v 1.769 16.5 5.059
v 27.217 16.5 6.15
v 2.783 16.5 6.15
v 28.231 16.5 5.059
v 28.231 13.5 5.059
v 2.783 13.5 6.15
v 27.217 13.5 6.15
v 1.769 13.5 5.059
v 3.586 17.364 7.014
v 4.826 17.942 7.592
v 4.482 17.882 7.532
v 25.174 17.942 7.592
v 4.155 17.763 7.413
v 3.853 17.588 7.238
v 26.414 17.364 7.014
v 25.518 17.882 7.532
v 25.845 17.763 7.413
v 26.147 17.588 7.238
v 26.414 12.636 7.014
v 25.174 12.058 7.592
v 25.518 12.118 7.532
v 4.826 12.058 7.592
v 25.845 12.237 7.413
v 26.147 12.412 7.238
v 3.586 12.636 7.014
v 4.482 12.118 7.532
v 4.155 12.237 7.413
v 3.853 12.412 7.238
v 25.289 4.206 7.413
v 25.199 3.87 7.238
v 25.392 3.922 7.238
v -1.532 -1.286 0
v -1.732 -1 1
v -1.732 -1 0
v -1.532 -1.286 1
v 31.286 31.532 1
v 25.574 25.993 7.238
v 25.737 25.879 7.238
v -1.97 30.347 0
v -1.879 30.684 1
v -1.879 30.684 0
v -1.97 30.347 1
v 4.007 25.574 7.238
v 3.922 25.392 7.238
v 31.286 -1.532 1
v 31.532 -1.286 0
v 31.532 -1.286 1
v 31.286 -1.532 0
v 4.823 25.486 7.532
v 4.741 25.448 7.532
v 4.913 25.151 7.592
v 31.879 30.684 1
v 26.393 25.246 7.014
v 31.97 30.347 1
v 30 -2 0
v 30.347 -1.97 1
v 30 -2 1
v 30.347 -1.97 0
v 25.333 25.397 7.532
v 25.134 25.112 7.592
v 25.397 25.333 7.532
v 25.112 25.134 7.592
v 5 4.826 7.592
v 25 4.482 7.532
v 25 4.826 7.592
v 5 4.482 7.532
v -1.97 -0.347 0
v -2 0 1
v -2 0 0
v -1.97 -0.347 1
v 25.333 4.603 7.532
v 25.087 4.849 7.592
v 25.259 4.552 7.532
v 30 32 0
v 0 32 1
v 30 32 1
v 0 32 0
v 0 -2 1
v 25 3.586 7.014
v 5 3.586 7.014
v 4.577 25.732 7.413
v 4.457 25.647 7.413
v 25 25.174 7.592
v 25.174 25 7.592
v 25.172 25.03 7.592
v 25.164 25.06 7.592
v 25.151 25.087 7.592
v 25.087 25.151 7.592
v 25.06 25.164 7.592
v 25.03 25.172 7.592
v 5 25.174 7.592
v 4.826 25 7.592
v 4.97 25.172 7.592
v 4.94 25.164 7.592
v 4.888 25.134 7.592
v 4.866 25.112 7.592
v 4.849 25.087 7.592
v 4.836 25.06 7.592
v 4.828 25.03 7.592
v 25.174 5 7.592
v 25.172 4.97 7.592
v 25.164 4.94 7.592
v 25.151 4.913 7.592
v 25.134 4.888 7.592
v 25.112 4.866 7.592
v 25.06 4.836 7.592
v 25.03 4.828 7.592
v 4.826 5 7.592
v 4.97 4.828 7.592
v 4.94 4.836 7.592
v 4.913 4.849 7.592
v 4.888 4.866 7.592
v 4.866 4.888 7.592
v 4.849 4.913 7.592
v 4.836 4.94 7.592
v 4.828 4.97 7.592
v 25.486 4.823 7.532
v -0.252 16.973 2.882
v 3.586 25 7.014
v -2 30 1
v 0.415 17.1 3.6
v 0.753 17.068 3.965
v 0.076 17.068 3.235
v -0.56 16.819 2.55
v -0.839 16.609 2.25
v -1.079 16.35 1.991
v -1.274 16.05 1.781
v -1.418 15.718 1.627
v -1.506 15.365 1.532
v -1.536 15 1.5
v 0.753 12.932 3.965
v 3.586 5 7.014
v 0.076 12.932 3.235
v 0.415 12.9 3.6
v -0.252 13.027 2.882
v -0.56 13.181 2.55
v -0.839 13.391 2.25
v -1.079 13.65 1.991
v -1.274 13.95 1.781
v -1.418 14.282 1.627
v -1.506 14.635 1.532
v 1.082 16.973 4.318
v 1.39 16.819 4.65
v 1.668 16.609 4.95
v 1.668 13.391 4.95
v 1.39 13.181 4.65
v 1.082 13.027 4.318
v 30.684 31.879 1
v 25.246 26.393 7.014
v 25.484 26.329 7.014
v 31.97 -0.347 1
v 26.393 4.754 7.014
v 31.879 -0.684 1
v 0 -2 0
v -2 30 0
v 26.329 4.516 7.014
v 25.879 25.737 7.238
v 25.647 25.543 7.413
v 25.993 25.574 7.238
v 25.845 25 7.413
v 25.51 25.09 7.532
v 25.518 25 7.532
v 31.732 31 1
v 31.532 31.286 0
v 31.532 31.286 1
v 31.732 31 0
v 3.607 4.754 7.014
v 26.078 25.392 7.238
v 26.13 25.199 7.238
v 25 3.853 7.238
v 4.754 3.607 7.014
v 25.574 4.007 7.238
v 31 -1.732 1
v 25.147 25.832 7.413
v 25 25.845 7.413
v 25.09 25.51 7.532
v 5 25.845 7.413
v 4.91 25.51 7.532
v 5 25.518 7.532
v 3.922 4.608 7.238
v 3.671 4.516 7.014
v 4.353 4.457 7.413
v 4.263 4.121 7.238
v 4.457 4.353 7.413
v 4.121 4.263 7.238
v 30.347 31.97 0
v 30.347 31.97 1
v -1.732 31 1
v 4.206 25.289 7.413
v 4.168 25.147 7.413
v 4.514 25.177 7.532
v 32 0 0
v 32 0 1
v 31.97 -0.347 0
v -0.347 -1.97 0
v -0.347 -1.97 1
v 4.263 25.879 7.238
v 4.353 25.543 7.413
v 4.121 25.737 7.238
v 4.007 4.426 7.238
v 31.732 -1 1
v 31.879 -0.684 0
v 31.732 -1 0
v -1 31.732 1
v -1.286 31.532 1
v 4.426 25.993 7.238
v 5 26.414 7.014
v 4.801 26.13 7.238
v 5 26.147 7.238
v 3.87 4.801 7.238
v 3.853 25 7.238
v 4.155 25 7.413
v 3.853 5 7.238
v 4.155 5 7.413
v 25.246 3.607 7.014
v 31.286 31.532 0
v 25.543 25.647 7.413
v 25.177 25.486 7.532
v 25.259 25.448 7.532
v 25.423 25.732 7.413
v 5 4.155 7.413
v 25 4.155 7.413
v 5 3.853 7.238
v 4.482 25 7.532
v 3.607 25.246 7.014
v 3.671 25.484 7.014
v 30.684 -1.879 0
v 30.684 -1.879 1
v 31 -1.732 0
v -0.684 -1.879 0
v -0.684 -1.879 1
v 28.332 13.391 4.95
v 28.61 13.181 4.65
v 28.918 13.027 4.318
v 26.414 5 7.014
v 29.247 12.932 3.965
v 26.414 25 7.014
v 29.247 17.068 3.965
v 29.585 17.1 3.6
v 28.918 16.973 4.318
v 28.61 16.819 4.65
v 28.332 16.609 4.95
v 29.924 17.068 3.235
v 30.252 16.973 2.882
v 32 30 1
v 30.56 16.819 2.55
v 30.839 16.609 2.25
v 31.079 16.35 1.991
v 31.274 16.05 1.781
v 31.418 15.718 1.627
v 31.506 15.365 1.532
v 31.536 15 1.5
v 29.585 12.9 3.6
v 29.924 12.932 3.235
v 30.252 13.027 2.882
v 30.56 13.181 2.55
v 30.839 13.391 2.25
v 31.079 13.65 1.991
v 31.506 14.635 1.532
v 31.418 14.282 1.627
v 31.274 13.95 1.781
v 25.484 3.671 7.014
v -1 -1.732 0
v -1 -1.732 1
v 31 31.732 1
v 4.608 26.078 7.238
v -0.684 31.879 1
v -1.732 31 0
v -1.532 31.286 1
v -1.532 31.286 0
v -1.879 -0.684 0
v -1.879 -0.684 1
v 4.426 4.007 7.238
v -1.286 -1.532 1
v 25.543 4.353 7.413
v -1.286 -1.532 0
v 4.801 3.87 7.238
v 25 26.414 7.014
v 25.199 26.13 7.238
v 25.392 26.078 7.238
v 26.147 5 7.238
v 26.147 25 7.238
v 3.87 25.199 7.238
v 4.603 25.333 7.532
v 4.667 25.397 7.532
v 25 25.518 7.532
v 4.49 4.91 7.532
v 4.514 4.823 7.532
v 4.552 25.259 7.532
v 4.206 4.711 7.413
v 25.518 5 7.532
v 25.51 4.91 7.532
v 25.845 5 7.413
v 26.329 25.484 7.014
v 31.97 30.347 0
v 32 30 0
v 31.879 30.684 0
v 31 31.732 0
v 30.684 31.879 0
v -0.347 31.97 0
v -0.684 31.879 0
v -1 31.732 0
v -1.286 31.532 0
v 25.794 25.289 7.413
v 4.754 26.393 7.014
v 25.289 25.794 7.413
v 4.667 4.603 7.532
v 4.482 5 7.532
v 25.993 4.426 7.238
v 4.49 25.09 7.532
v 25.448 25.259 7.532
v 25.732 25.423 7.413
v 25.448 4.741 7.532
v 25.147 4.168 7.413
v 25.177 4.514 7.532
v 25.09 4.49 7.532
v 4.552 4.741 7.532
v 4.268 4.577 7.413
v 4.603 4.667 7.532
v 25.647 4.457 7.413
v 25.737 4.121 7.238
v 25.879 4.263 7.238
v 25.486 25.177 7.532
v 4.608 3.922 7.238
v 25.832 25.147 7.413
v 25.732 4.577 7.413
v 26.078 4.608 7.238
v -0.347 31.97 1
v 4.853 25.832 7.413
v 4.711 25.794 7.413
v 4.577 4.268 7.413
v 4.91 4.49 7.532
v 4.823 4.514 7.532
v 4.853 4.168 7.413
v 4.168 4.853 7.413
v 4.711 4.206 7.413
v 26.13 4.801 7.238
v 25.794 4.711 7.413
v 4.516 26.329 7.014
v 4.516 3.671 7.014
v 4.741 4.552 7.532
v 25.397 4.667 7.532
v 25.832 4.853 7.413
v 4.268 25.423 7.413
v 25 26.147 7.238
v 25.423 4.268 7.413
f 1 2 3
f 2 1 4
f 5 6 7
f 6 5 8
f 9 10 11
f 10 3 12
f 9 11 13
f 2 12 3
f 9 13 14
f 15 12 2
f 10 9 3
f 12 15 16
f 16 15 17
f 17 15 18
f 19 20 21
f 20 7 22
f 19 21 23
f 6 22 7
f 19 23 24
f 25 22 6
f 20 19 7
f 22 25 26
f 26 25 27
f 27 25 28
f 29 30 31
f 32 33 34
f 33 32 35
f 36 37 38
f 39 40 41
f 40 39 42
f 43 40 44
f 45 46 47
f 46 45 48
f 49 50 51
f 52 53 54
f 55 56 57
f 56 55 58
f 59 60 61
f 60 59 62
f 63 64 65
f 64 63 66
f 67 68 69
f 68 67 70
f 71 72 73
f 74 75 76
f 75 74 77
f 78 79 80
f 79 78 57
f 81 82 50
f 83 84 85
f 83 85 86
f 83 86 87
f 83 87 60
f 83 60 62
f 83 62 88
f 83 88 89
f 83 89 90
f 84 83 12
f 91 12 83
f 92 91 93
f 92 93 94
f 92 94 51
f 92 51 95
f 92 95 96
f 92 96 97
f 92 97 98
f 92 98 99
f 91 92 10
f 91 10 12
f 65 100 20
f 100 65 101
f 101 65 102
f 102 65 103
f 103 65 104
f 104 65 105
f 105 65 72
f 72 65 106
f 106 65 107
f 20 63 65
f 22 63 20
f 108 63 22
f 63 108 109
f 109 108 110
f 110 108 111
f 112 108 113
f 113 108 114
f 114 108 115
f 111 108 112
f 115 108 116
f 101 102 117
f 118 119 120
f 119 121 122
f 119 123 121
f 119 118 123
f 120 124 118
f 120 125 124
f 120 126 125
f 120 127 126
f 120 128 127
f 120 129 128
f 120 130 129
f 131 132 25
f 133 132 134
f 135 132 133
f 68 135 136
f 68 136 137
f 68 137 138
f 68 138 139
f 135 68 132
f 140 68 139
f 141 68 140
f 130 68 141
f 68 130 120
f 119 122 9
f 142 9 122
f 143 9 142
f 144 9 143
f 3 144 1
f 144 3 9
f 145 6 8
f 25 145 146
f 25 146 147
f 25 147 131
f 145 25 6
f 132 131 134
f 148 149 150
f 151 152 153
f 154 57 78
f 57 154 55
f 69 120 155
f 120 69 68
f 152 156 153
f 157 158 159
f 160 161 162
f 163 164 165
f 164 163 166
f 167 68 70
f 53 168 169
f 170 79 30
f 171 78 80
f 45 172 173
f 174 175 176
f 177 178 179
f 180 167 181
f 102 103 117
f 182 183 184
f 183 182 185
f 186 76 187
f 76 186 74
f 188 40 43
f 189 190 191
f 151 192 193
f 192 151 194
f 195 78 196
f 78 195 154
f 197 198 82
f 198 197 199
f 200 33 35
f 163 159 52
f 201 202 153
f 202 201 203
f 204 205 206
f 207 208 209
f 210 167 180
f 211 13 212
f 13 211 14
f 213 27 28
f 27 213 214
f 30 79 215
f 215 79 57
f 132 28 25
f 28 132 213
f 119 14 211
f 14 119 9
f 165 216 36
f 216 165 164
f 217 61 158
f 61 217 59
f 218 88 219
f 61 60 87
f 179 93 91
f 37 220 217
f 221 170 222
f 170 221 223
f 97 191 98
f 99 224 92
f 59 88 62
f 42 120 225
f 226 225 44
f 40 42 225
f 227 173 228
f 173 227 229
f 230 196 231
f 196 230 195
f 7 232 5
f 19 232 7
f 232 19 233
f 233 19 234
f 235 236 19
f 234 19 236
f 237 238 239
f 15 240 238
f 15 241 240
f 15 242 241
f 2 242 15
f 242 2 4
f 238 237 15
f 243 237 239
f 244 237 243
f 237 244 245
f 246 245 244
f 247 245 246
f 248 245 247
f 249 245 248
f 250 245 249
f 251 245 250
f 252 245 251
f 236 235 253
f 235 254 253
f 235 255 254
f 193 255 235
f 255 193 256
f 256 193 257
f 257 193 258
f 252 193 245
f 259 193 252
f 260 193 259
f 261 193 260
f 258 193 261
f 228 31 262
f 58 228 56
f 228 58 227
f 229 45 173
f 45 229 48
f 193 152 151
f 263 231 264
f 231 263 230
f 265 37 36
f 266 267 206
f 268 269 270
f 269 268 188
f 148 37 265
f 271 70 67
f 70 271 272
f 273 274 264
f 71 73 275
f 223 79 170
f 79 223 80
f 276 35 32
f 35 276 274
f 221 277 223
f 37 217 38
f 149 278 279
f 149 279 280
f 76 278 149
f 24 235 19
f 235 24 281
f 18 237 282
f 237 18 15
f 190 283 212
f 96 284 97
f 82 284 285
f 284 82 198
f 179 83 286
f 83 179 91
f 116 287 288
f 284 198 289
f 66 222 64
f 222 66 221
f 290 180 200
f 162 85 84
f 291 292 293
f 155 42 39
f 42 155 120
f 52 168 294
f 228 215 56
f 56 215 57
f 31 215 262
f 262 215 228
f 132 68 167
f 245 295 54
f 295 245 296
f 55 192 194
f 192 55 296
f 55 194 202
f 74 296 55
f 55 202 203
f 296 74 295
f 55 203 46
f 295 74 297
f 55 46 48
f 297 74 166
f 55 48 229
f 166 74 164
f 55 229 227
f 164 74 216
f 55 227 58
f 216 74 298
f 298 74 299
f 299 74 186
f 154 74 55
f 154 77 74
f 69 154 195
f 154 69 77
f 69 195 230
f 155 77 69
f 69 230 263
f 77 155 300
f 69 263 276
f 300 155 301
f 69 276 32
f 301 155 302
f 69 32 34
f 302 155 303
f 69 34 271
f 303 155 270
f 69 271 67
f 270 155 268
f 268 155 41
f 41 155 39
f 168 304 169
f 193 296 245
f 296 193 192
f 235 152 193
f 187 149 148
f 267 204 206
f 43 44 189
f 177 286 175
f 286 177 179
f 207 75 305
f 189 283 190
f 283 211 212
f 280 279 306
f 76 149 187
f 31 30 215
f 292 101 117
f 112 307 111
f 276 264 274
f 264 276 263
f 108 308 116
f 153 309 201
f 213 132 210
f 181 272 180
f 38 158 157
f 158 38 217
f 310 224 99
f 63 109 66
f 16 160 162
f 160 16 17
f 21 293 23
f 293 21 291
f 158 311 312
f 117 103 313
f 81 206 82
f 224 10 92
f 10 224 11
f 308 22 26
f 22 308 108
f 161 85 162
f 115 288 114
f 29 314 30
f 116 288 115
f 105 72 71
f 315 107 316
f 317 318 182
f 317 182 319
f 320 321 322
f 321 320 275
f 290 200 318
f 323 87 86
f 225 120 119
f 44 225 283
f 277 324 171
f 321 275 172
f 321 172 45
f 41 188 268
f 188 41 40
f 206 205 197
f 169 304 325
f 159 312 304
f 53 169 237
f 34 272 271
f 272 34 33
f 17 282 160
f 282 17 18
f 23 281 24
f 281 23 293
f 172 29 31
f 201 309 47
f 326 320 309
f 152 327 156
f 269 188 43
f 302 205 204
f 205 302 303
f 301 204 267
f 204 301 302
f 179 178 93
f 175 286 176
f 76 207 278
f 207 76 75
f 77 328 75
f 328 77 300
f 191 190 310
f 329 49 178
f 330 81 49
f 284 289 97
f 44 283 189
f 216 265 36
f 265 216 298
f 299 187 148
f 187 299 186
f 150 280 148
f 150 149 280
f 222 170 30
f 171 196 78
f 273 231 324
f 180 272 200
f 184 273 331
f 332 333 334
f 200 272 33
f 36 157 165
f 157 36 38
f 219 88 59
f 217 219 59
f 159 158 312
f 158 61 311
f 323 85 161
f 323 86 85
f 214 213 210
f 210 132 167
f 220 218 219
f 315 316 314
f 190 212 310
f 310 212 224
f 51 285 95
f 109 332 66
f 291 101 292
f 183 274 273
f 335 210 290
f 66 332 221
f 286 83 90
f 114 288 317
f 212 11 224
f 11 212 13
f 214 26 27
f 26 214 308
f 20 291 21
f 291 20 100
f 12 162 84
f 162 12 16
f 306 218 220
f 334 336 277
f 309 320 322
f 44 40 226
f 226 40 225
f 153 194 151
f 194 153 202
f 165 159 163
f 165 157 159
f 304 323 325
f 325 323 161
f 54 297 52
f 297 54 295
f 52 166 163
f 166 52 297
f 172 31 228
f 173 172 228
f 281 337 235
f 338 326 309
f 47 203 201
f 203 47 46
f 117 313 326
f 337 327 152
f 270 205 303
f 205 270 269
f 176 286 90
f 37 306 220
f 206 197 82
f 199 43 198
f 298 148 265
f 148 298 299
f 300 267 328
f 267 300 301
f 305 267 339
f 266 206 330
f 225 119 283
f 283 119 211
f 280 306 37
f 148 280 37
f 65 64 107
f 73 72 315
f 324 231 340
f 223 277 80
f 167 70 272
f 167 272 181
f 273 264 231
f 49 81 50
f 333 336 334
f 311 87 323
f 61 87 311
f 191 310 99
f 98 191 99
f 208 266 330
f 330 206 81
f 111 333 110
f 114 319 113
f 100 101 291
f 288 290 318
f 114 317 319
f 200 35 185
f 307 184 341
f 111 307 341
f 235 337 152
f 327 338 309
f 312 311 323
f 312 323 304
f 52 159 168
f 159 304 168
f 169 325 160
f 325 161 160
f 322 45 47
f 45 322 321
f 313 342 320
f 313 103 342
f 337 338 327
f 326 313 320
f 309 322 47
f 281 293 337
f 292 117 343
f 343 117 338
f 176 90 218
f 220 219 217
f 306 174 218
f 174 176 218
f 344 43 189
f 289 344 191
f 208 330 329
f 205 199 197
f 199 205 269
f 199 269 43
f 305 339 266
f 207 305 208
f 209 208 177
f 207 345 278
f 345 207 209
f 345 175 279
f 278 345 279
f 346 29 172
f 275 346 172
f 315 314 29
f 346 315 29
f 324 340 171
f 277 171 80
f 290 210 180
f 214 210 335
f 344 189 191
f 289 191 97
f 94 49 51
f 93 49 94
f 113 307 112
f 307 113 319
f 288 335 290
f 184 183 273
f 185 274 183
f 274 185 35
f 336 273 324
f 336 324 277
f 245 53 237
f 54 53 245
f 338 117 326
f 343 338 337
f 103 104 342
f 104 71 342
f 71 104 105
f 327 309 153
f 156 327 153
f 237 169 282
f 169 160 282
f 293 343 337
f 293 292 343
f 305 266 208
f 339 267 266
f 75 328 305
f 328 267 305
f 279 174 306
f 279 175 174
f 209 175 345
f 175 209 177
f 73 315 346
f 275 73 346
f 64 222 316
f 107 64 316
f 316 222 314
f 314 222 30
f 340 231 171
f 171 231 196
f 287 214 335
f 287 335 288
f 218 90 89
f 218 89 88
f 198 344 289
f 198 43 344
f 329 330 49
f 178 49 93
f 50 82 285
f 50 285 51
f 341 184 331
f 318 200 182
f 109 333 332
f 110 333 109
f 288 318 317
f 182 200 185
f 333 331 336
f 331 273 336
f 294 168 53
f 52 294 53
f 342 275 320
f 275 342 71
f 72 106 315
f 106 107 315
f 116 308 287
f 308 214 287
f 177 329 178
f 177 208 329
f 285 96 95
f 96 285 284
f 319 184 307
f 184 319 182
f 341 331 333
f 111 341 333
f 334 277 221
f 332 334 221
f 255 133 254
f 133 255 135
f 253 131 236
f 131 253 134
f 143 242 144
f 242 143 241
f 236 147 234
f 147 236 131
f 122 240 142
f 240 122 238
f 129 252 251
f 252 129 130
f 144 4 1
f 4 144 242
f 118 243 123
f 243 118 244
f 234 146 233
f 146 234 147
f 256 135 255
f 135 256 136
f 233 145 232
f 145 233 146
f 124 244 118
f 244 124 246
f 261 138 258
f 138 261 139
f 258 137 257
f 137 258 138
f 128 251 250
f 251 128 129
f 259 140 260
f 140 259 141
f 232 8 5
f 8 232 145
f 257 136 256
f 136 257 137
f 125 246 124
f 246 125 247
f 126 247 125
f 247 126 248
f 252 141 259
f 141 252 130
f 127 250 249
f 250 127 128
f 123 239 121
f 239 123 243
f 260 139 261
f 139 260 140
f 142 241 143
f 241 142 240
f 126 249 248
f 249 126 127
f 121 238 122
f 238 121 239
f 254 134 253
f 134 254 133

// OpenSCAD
// Puppy run foot
// (c) 2022 Michiel Fokke <michiel@fokke.org>
// License: CC BY-SA 2.0
// https://creativecommons.org/licenses/by-sa/2.0/legalcode

$fn = 36;
WIDTH = 30;
HEIGHT = 30;
SHIFT_WIDTH = 5;
SHIFT_HEIGHT = SHIFT_WIDTH;
DEPTH = 7.6;
RADIUS = 2;

GRATE_SHIFT = 2;
GRATE_SLIT_HEIGHT = 3;

// Physical parameters;

RUN_GRATE_RADIUS = 2.1;

// No configuration after this line

module foot_base() {
    hull() {
        for (x = [0, WIDTH]) {
            for (y = [0, HEIGHT]) {
                for (z = [0, DEPTH-RADIUS]) {
                    x_shift = (z==0) ? x : (x==0) ? SHIFT_WIDTH : x - SHIFT_WIDTH; 
                    y_shift = (z==0) ? y : (y==0) ? SHIFT_HEIGHT : y - SHIFT_HEIGHT; 
                    translate([x_shift, y_shift, z])
                        if (z==0) cylinder(r=RADIUS);
                        else sphere(r=RADIUS);
                }
            }
        }
    }
}

module grate_fit() {
    translate([-WIDTH/2,0,0]) rotate([0, 90, 0])
    cylinder(r=RUN_GRATE_RADIUS, h=2*WIDTH);
}

module grate_slit() {
    slit_height = GRATE_SLIT_HEIGHT;
    height = 2*RUN_GRATE_RADIUS;
    union(){
        translate([0,-slit_height/2, 0])
        cube([WIDTH, slit_height, 2*RUN_GRATE_RADIUS]);
        translate([0, 0, height/4]) rotate([45, 0, 0])
            cube([WIDTH, height, height]);
    }
}

module puppy_run_foot() {
    difference(){
        foot_base();
        translate([0, HEIGHT/2, DEPTH-RADIUS-GRATE_SHIFT]) grate_fit();
        translate([0, HEIGHT/2, DEPTH-RADIUS-GRATE_SHIFT]) grate_slit();
    }
}

puppy_run_foot();
